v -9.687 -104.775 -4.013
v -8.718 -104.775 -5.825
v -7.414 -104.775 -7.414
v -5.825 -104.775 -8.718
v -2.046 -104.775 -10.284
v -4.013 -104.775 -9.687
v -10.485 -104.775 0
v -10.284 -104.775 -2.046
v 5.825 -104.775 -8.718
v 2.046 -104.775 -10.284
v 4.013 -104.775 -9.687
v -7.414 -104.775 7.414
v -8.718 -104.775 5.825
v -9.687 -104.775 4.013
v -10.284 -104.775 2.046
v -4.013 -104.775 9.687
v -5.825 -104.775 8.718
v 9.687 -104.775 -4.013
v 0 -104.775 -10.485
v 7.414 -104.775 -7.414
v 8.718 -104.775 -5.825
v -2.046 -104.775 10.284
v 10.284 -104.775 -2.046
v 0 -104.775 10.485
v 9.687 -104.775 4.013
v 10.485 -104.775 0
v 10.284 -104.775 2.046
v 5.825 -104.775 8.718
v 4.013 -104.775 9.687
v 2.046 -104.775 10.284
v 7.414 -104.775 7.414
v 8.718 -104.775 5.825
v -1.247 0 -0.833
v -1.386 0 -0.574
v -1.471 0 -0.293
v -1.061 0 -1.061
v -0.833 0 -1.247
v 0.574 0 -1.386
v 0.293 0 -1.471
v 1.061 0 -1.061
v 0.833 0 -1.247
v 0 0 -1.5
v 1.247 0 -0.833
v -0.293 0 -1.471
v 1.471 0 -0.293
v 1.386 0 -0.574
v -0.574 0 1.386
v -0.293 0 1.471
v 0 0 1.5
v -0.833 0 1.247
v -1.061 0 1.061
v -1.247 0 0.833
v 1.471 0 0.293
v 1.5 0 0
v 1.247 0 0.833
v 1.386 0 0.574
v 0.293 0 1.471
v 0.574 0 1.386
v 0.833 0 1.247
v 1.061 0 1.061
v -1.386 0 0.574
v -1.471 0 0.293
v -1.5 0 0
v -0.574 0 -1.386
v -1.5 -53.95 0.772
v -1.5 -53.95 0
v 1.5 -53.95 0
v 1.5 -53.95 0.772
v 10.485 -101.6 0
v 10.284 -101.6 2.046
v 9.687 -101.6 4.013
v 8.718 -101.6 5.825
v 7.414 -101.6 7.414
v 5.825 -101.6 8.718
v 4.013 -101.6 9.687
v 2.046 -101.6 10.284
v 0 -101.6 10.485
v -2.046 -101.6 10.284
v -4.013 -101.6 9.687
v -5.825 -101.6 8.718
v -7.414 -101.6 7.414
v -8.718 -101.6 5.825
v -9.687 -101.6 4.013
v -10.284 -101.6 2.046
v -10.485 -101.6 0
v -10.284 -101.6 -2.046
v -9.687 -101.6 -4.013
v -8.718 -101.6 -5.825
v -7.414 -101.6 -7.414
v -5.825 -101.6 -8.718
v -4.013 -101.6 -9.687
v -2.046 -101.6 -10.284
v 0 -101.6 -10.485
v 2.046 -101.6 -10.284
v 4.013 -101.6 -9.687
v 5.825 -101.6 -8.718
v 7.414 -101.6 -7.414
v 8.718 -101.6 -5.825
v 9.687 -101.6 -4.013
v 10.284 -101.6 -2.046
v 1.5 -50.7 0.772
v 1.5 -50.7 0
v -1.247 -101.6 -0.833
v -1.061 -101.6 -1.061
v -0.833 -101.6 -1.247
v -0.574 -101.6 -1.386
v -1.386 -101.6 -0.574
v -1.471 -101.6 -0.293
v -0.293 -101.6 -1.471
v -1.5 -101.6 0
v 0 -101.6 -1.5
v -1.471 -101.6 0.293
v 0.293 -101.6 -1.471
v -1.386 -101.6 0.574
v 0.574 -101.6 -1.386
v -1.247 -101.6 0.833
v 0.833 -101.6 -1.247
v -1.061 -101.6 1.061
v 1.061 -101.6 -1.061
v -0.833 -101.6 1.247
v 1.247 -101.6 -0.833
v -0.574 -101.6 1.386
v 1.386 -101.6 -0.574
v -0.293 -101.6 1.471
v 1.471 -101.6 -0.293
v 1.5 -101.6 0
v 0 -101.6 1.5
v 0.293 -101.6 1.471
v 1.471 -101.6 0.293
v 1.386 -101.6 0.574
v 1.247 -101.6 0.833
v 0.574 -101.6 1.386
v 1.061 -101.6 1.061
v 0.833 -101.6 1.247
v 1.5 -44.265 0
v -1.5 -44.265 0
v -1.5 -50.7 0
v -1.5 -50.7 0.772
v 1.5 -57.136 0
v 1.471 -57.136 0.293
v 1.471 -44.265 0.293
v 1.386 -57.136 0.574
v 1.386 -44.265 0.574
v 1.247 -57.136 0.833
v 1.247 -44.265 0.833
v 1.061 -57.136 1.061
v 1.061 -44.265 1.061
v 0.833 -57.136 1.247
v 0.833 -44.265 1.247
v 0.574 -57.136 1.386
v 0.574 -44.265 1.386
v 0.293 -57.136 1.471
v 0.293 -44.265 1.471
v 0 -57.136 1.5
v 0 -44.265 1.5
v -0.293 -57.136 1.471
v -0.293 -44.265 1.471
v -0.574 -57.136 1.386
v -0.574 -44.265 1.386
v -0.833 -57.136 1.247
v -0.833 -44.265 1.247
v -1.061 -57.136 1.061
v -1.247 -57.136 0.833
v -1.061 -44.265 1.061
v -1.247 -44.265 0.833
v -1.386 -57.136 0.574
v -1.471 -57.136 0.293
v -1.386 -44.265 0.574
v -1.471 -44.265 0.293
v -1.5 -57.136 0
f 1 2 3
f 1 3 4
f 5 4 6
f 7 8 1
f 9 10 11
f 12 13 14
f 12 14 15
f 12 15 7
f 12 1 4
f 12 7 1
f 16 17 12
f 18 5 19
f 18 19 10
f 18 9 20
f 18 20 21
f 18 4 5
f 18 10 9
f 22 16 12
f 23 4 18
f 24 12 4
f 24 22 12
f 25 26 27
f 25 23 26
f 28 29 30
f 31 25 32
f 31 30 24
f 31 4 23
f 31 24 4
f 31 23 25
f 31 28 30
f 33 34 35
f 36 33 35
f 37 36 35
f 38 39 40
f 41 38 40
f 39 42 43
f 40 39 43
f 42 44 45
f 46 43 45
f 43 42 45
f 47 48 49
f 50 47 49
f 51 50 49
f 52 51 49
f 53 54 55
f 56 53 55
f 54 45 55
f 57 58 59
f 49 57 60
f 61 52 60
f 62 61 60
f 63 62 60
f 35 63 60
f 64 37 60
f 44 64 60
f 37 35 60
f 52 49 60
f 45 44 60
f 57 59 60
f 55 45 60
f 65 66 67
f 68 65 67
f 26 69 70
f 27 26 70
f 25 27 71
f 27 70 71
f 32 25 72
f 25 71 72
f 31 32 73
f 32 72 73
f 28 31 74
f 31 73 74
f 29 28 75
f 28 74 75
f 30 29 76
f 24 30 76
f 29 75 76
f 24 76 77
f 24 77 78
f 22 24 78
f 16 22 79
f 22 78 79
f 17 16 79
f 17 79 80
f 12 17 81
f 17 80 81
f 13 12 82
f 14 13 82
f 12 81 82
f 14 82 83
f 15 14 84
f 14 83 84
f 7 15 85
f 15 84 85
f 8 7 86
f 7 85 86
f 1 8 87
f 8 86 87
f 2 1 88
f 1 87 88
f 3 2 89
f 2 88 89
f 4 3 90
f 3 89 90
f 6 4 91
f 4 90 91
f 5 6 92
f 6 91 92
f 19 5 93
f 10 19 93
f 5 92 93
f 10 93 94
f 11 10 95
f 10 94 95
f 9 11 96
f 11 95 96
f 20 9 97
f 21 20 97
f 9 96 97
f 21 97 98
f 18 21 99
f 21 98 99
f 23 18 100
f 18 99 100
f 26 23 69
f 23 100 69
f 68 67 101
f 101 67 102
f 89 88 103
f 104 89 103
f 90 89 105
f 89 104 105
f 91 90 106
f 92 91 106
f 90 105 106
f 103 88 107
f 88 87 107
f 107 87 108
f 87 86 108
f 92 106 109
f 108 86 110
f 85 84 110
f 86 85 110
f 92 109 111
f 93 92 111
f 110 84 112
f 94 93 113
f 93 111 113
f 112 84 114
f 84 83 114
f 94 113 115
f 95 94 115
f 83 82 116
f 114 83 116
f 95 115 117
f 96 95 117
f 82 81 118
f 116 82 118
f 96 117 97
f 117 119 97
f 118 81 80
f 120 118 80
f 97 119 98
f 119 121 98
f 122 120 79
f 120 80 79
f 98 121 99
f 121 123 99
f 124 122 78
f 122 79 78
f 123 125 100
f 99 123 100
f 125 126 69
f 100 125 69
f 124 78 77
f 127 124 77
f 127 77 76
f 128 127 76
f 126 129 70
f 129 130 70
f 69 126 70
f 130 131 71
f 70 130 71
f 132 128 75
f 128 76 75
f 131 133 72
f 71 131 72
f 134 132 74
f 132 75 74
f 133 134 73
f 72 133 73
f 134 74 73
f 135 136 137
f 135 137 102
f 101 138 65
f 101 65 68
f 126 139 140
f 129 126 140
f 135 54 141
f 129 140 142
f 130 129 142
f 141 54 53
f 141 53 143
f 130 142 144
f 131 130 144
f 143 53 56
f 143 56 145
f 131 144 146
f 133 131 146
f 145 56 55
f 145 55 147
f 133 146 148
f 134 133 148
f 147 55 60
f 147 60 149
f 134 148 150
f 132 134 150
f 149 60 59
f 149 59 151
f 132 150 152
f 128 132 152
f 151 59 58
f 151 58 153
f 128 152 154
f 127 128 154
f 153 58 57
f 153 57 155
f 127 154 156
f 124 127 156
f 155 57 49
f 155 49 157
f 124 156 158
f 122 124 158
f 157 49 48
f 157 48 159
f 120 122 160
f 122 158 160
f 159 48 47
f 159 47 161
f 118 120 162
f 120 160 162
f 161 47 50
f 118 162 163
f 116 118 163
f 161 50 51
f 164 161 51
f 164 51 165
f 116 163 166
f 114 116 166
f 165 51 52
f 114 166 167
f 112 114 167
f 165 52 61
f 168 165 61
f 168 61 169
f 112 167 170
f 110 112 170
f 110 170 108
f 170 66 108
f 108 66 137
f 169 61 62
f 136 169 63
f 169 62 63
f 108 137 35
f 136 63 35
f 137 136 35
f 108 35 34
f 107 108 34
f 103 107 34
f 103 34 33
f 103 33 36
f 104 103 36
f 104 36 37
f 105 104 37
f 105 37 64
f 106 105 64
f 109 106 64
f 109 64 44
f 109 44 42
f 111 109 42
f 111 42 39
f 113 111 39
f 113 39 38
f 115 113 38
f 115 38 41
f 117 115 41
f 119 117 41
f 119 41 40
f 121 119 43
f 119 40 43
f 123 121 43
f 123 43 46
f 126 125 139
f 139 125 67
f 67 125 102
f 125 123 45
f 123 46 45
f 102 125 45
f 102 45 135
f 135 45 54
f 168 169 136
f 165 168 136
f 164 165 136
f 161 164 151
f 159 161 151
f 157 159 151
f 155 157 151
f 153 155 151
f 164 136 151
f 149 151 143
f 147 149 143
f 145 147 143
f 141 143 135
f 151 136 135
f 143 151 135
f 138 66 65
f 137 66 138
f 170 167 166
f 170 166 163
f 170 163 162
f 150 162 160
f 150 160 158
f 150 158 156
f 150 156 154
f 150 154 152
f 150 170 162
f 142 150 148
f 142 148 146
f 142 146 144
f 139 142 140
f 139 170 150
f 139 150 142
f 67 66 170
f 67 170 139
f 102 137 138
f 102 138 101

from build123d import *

# Parameters (mm, degrees)
F0_R      = 1.5
F1_DEPTH  = 101.6
F2_R      = 10.4851931458
F3_DEPTH  = 3.175
F4_W      = 10.1616978645
F4_H      = 12.8714852035
F5_DEPTH  = 20.24025
F7_DEPTH  = 8.96719
F9_W      = 3
F9_H      = 3.249252215
F10_DEPTH = 0.77209


with BuildPart() as f1:
    # F0 (on Front) → F1 (new body)
    with BuildSketch(Plane.XZ):
        Circle(F0_R)
    extrude(amount=F1_DEPTH)

    # F2 (on face) → F3 (join)
    with BuildSketch(Plane.XZ.offset(101.6)):
        Circle(F2_R)
    extrude(amount=F3_DEPTH)

    # F4 (on Top) → F5 (cut)
    with BuildSketch(Plane.XY):
        with Locations((0, -50.7002491504)):
            Rectangle(F4_W, F4_H)
    extrude(amount=F5_DEPTH, mode=Mode.SUBTRACT)

    # F9 (on face) → F10 (join)
    with BuildSketch(Plane.XY):
        with Locations((0, -52.3248752579)):
            Rectangle(F9_W, F9_H)
    extrude(amount=F10_DEPTH)


with BuildPart() as f7:
    # F6 (on face) → F7 (new body)
    with BuildSketch(Plane.XZ.offset(44.2645065486)):
        with BuildLine():
            Line((0.595669005, 1.3766547993), (-0.595669005, 1.3766547993))
            Line((-0.595669005, 1.3766547993), (-0.595669005, 0.1358163867))
            Line((-0.595669005, 0.1358163867), (1.3222411928, 0.1358163867))
            Line((1.3222411928, 0.1358163867), (1.3222411928, 0.7082924736))
            ThreePointArc((1.3222411928, 0.7082924736), (1.0155155987, 1.1039601753), (0.595669005, 1.3766547993))
        make_face()
        with BuildLine():
            Line((1.3222411928, 1.3766547993), (0.595669005, 1.3766547993))
            ThreePointArc((0.595669005, 1.3766547993), (1.0155155987, 1.1039601753), (1.3222411928, 0.7082924736))
            Line((1.3222411928, 0.7082924736), (1.3222411928, 1.3766547993))
        make_face()
    extrude(amount=F7_DEPTH)


solid = f1.part
